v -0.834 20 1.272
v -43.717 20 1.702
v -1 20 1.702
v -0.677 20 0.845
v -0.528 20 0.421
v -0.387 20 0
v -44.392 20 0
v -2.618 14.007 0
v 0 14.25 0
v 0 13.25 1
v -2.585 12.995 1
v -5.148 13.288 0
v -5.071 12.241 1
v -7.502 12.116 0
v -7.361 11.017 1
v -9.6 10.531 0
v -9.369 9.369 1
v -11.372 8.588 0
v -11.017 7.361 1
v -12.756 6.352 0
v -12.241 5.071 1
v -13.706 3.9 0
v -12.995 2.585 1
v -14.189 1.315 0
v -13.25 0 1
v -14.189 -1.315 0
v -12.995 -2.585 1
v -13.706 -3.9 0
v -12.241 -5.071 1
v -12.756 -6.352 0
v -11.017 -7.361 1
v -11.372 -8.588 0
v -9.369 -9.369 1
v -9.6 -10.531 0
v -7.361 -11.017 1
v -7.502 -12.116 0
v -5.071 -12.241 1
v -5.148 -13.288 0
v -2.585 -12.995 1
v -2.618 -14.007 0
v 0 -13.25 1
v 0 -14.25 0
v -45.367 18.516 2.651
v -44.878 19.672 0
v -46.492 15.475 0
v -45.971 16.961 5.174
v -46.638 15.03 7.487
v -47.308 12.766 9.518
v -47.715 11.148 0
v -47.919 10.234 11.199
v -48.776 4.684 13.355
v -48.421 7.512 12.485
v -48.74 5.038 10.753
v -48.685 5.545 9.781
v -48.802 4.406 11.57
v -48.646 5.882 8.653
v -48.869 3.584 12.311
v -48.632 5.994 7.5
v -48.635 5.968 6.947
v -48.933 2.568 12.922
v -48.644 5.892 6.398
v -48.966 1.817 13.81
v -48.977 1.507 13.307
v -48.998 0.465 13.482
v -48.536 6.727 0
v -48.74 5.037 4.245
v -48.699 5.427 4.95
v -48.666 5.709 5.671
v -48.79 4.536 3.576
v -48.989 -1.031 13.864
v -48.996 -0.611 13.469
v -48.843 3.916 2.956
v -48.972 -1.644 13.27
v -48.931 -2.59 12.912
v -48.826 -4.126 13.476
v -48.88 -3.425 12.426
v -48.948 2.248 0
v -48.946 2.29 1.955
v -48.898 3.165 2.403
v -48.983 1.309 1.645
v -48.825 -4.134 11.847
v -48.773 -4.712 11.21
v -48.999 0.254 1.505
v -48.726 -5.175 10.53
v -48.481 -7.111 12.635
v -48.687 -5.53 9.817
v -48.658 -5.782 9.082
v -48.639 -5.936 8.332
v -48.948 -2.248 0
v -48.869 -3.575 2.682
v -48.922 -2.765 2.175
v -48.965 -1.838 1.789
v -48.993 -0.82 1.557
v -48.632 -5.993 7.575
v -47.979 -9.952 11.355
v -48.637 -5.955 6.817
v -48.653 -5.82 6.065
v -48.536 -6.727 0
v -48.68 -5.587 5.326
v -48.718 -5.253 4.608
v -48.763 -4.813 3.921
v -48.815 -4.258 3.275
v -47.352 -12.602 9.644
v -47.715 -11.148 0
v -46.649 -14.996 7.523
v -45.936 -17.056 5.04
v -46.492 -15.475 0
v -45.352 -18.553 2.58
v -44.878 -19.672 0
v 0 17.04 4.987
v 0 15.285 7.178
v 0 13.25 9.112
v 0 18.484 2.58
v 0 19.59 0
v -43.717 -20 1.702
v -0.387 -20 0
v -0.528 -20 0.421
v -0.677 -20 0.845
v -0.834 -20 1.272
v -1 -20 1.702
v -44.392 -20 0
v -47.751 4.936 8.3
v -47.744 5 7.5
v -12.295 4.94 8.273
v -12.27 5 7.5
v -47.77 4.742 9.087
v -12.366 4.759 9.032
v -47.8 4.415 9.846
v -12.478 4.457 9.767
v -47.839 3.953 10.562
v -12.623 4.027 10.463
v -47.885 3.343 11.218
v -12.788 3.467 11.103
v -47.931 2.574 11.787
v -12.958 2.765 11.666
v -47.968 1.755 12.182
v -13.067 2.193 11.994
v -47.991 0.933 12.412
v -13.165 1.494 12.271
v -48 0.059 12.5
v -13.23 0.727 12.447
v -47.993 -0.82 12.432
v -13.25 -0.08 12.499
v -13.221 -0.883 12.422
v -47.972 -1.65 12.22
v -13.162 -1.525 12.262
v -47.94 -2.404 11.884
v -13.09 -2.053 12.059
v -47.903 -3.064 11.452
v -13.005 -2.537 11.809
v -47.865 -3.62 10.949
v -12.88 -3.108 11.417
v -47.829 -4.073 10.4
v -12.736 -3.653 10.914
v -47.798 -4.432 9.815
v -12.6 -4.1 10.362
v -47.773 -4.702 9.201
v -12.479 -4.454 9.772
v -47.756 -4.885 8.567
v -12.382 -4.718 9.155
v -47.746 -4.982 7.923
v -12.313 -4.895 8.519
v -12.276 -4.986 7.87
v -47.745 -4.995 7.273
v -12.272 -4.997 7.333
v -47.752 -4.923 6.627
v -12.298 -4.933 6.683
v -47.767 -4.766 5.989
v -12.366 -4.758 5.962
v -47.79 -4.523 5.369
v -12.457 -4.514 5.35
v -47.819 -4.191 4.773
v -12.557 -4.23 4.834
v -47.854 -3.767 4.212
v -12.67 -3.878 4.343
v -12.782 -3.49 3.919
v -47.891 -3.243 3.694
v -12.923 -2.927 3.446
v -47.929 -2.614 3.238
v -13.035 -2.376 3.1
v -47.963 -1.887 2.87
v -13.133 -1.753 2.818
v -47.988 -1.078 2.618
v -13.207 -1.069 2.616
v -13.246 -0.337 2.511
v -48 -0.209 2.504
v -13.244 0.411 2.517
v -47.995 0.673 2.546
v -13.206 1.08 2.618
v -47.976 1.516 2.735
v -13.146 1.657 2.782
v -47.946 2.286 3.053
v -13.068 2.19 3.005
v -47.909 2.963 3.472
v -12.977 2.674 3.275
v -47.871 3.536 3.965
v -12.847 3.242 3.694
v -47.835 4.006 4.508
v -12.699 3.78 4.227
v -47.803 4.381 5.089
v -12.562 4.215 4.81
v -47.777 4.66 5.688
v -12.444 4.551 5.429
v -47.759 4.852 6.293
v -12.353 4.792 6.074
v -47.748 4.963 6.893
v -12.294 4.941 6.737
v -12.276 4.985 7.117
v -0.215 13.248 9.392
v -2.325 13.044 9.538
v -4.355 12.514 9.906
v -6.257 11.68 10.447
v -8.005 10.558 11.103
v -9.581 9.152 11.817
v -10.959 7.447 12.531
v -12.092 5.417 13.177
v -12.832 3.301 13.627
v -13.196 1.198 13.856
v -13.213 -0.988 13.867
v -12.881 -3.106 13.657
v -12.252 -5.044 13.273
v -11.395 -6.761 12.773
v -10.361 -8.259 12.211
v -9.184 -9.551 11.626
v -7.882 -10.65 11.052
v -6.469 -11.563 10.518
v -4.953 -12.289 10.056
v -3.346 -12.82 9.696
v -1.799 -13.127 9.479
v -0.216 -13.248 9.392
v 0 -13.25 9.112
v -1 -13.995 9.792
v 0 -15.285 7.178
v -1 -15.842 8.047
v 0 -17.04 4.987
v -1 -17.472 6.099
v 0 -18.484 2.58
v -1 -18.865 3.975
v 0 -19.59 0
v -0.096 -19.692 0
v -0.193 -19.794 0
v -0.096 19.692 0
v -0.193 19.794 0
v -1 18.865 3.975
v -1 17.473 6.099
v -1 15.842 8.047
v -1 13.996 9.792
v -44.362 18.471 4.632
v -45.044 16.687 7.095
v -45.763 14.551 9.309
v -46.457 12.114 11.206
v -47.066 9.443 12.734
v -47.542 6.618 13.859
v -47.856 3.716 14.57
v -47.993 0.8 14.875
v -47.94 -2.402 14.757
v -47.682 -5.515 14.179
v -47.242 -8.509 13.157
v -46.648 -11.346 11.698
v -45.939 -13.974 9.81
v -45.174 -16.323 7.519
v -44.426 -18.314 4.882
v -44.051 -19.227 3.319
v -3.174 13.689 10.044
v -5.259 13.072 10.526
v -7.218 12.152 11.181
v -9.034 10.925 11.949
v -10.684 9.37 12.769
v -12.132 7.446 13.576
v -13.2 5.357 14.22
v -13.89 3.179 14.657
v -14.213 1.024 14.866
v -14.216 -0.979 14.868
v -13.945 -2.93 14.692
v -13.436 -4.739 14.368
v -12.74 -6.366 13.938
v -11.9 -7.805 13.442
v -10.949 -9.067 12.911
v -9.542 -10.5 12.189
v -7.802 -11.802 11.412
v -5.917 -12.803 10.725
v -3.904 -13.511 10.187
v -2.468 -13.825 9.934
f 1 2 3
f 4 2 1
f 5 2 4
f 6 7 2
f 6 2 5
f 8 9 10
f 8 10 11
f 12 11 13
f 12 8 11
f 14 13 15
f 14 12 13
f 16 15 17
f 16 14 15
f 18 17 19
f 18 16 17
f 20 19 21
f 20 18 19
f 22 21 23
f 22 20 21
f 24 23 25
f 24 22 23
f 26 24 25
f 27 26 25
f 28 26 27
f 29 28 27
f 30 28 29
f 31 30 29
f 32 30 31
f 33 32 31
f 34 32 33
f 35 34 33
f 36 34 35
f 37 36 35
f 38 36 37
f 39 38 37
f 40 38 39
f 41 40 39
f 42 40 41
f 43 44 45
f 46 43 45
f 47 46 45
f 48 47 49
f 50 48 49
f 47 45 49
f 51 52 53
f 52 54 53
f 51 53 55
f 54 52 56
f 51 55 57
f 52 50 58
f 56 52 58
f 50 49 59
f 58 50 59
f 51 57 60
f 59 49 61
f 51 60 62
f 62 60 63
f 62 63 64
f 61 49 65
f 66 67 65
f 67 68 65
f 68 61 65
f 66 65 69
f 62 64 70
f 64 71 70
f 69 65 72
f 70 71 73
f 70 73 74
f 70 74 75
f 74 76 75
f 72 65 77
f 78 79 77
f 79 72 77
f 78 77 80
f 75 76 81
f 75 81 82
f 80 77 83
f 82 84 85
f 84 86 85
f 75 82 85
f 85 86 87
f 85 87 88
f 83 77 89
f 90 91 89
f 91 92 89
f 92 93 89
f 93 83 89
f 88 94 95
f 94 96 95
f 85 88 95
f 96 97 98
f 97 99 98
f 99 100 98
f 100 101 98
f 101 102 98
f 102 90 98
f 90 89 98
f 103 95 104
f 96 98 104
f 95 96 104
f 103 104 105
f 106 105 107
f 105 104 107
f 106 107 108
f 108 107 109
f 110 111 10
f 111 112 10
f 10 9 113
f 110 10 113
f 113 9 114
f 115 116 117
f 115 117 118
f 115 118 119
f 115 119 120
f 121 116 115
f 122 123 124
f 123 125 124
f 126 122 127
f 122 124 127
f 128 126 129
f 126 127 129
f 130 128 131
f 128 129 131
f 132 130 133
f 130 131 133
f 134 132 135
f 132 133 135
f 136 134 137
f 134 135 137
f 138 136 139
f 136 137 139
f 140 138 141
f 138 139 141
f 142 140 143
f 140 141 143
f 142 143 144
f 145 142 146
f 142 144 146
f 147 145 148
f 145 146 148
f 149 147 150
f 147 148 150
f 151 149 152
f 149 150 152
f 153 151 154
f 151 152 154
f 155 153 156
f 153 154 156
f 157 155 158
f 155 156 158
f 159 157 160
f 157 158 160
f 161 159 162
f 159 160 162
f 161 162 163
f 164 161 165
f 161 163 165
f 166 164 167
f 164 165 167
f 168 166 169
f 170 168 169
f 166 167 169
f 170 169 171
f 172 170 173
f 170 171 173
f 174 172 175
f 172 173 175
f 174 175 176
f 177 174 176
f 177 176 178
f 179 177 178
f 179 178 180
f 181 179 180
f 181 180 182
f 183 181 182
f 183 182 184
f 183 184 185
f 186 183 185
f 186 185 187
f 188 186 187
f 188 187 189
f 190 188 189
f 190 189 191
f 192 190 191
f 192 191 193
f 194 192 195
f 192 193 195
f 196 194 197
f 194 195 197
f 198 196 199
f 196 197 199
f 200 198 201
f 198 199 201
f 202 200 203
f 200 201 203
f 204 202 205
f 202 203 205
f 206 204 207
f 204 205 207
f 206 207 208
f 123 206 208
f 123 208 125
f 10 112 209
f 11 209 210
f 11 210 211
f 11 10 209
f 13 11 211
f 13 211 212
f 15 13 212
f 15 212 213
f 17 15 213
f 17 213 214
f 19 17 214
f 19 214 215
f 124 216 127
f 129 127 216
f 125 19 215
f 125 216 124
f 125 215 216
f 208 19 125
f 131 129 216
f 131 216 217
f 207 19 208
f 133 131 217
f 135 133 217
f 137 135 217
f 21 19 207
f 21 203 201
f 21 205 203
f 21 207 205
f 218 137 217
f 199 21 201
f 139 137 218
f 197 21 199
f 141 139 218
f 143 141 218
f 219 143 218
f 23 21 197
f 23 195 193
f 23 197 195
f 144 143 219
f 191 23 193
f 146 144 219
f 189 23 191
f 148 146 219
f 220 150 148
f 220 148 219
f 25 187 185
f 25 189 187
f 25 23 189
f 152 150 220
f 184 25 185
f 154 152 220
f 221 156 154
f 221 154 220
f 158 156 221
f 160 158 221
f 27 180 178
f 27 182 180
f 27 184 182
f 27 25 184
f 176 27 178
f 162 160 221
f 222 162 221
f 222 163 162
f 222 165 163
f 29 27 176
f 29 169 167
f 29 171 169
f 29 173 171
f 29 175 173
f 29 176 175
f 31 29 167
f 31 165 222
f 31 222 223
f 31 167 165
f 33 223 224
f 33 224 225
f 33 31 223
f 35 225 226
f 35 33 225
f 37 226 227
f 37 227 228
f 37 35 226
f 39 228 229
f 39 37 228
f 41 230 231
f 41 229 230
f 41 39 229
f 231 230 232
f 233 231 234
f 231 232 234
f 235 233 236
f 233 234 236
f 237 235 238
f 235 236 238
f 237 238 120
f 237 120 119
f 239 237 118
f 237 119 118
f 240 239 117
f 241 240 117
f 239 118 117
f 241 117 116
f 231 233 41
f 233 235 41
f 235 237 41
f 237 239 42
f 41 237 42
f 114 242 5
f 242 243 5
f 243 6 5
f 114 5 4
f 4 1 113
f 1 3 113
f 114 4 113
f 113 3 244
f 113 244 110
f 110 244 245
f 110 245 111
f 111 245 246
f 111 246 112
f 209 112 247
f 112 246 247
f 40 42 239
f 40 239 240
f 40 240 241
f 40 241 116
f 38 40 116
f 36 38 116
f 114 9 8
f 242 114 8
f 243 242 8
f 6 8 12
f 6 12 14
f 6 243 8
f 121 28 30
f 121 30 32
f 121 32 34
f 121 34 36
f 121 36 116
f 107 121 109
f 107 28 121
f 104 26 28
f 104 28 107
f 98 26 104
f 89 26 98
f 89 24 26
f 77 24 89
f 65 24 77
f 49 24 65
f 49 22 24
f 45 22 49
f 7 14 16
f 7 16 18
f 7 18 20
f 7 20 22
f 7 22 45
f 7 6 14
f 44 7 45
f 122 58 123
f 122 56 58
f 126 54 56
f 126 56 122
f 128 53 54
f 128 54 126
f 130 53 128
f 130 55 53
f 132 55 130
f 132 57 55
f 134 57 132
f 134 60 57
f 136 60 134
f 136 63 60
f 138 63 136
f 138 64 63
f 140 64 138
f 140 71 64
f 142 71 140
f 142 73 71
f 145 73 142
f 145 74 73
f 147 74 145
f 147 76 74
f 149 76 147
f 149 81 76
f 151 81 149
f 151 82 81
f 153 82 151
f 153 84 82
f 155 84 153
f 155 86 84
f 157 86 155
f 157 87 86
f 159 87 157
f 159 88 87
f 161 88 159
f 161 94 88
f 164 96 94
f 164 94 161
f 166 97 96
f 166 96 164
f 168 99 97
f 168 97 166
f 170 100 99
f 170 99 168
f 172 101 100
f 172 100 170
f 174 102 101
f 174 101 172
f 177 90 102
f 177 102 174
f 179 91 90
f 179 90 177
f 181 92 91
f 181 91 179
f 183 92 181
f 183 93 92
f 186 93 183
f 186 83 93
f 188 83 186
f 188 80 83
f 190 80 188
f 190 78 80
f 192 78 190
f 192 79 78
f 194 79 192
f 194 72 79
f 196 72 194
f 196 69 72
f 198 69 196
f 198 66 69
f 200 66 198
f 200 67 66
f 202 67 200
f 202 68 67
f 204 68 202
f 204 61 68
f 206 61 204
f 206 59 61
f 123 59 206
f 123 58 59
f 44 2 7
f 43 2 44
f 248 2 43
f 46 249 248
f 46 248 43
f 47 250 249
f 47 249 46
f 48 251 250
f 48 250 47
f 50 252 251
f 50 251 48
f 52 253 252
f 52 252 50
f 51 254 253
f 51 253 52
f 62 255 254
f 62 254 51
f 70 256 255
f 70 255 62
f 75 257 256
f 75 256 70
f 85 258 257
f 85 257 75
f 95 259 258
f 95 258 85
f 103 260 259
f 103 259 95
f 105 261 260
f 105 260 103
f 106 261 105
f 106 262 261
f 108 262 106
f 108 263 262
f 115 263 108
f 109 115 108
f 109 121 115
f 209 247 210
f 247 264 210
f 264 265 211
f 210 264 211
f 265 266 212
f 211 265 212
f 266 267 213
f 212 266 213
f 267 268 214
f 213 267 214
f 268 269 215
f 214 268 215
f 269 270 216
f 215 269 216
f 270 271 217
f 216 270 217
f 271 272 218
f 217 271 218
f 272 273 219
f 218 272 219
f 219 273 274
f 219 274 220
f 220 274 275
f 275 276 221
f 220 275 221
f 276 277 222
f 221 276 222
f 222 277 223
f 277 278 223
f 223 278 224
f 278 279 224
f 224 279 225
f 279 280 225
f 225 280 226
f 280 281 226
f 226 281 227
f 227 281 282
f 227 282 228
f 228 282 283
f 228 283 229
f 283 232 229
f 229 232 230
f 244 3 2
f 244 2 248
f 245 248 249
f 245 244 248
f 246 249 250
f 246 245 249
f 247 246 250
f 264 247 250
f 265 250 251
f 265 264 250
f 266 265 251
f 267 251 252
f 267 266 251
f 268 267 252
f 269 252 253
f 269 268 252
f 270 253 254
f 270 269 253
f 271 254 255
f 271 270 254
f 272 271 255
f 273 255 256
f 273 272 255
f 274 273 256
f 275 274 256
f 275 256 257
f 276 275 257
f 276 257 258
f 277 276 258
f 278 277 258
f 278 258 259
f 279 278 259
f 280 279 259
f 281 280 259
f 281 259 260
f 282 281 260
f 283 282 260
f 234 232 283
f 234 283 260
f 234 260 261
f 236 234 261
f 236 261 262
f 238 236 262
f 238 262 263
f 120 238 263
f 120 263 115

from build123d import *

# Parameters (mm, degrees)
PAD_DEPTH         = 15
SKETCH001_R       = 5
POCKET_DEPTH      = 35.001
POCKET_DEPTH_BACK = -14.001
SKETCH002_R       = 33.208943
SKETCH002_R_2     = 21.759288
POCKET001_DEPTH   = 49.001
CHAMFER_SIZE      = 1
CHAMFER001_SIZE   = 1
CHAMFER002_SIZE   = 1
CHAMFER003_SIZE   = 1
CHAMFER004_SIZE   = 1
CHAMFER005_SIZE   = 1


with BuildPart() as part:
    # Sketch → Pad (new body)
    with BuildSketch(Plane.XY):
        with BuildLine():
            ThreePointArc((0, 13.25), (-13.25, 0), (0, -13.25))
            Line((0, -20), (0, -13.25))
            Line((0, -20), (-44.732538, -20))
            ThreePointArc((-44.732538, 20), (-49, 0), (-44.732538, -20))
            Line((-44.732538, 20), (0, 20))
            Line((0, 13.25), (0, 20))
        make_face()
    extrude(amount=PAD_DEPTH)

    # Sketch001 → Pocket (cut, two sides)
    with BuildSketch(Plane.YZ.offset(-14)) as pocket_sk:
        with Locations((0, 7.5)):
            Circle(SKETCH001_R)
    extrude(amount=-POCKET_DEPTH, mode=Mode.SUBTRACT)
    extrude(pocket_sk.sketch, amount=-POCKET_DEPTH_BACK, mode=Mode.SUBTRACT)

    # Sketch002 → Pocket001 (cut, through all)
    with BuildSketch(Plane.YZ):
        with Locations((0, -6.869182)):
            Circle(SKETCH002_R)
        with Locations((0, -6.869182)):
            Circle(SKETCH002_R_2, mode=Mode.SUBTRACT)
    extrude(amount=-POCKET001_DEPTH, mode=Mode.SUBTRACT)

    # Chamfer
    chamfer_edges = [part.edges().sort_by_distance(p)[0] for p in [
        (-48.74423, -5, 7.5),
    ]]
    chamfer(chamfer_edges, length=CHAMFER_SIZE)

    # Chamfer001
    chamfer001_edges = [part.edges().sort_by_distance(p)[0] for p in [
        (-13.25, 0, 0),
    ]]
    chamfer(chamfer001_edges, length=CHAMFER001_SIZE)

    # Chamfer002
    chamfer002_edges = [part.edges().sort_by_distance(p)[0] for p in [
        (-49, 0, 14.890106),
    ]]
    chamfer(chamfer002_edges, length=CHAMFER002_SIZE)

    # Chamfer003
    chamfer003_edges = [part.edges().sort_by_distance(p)[0] for p in [
        (-13.25, 0, 14.890106),
    ]]
    chamfer(chamfer003_edges, length=CHAMFER003_SIZE)

    # Chamfer004
    chamfer004_edges = [part.edges().sort_by_distance(p)[0] for p in [
        (0, -17.48534, 6.081861),
    ]]
    chamfer(chamfer004_edges, length=CHAMFER004_SIZE)

    # Chamfer005
    chamfer005_edges = [part.edges().sort_by_distance(p)[0] for p in [
        (0, 17.485451, 6.081711),
    ]]
    chamfer(chamfer005_edges, length=CHAMFER005_SIZE)


solid = part.part
